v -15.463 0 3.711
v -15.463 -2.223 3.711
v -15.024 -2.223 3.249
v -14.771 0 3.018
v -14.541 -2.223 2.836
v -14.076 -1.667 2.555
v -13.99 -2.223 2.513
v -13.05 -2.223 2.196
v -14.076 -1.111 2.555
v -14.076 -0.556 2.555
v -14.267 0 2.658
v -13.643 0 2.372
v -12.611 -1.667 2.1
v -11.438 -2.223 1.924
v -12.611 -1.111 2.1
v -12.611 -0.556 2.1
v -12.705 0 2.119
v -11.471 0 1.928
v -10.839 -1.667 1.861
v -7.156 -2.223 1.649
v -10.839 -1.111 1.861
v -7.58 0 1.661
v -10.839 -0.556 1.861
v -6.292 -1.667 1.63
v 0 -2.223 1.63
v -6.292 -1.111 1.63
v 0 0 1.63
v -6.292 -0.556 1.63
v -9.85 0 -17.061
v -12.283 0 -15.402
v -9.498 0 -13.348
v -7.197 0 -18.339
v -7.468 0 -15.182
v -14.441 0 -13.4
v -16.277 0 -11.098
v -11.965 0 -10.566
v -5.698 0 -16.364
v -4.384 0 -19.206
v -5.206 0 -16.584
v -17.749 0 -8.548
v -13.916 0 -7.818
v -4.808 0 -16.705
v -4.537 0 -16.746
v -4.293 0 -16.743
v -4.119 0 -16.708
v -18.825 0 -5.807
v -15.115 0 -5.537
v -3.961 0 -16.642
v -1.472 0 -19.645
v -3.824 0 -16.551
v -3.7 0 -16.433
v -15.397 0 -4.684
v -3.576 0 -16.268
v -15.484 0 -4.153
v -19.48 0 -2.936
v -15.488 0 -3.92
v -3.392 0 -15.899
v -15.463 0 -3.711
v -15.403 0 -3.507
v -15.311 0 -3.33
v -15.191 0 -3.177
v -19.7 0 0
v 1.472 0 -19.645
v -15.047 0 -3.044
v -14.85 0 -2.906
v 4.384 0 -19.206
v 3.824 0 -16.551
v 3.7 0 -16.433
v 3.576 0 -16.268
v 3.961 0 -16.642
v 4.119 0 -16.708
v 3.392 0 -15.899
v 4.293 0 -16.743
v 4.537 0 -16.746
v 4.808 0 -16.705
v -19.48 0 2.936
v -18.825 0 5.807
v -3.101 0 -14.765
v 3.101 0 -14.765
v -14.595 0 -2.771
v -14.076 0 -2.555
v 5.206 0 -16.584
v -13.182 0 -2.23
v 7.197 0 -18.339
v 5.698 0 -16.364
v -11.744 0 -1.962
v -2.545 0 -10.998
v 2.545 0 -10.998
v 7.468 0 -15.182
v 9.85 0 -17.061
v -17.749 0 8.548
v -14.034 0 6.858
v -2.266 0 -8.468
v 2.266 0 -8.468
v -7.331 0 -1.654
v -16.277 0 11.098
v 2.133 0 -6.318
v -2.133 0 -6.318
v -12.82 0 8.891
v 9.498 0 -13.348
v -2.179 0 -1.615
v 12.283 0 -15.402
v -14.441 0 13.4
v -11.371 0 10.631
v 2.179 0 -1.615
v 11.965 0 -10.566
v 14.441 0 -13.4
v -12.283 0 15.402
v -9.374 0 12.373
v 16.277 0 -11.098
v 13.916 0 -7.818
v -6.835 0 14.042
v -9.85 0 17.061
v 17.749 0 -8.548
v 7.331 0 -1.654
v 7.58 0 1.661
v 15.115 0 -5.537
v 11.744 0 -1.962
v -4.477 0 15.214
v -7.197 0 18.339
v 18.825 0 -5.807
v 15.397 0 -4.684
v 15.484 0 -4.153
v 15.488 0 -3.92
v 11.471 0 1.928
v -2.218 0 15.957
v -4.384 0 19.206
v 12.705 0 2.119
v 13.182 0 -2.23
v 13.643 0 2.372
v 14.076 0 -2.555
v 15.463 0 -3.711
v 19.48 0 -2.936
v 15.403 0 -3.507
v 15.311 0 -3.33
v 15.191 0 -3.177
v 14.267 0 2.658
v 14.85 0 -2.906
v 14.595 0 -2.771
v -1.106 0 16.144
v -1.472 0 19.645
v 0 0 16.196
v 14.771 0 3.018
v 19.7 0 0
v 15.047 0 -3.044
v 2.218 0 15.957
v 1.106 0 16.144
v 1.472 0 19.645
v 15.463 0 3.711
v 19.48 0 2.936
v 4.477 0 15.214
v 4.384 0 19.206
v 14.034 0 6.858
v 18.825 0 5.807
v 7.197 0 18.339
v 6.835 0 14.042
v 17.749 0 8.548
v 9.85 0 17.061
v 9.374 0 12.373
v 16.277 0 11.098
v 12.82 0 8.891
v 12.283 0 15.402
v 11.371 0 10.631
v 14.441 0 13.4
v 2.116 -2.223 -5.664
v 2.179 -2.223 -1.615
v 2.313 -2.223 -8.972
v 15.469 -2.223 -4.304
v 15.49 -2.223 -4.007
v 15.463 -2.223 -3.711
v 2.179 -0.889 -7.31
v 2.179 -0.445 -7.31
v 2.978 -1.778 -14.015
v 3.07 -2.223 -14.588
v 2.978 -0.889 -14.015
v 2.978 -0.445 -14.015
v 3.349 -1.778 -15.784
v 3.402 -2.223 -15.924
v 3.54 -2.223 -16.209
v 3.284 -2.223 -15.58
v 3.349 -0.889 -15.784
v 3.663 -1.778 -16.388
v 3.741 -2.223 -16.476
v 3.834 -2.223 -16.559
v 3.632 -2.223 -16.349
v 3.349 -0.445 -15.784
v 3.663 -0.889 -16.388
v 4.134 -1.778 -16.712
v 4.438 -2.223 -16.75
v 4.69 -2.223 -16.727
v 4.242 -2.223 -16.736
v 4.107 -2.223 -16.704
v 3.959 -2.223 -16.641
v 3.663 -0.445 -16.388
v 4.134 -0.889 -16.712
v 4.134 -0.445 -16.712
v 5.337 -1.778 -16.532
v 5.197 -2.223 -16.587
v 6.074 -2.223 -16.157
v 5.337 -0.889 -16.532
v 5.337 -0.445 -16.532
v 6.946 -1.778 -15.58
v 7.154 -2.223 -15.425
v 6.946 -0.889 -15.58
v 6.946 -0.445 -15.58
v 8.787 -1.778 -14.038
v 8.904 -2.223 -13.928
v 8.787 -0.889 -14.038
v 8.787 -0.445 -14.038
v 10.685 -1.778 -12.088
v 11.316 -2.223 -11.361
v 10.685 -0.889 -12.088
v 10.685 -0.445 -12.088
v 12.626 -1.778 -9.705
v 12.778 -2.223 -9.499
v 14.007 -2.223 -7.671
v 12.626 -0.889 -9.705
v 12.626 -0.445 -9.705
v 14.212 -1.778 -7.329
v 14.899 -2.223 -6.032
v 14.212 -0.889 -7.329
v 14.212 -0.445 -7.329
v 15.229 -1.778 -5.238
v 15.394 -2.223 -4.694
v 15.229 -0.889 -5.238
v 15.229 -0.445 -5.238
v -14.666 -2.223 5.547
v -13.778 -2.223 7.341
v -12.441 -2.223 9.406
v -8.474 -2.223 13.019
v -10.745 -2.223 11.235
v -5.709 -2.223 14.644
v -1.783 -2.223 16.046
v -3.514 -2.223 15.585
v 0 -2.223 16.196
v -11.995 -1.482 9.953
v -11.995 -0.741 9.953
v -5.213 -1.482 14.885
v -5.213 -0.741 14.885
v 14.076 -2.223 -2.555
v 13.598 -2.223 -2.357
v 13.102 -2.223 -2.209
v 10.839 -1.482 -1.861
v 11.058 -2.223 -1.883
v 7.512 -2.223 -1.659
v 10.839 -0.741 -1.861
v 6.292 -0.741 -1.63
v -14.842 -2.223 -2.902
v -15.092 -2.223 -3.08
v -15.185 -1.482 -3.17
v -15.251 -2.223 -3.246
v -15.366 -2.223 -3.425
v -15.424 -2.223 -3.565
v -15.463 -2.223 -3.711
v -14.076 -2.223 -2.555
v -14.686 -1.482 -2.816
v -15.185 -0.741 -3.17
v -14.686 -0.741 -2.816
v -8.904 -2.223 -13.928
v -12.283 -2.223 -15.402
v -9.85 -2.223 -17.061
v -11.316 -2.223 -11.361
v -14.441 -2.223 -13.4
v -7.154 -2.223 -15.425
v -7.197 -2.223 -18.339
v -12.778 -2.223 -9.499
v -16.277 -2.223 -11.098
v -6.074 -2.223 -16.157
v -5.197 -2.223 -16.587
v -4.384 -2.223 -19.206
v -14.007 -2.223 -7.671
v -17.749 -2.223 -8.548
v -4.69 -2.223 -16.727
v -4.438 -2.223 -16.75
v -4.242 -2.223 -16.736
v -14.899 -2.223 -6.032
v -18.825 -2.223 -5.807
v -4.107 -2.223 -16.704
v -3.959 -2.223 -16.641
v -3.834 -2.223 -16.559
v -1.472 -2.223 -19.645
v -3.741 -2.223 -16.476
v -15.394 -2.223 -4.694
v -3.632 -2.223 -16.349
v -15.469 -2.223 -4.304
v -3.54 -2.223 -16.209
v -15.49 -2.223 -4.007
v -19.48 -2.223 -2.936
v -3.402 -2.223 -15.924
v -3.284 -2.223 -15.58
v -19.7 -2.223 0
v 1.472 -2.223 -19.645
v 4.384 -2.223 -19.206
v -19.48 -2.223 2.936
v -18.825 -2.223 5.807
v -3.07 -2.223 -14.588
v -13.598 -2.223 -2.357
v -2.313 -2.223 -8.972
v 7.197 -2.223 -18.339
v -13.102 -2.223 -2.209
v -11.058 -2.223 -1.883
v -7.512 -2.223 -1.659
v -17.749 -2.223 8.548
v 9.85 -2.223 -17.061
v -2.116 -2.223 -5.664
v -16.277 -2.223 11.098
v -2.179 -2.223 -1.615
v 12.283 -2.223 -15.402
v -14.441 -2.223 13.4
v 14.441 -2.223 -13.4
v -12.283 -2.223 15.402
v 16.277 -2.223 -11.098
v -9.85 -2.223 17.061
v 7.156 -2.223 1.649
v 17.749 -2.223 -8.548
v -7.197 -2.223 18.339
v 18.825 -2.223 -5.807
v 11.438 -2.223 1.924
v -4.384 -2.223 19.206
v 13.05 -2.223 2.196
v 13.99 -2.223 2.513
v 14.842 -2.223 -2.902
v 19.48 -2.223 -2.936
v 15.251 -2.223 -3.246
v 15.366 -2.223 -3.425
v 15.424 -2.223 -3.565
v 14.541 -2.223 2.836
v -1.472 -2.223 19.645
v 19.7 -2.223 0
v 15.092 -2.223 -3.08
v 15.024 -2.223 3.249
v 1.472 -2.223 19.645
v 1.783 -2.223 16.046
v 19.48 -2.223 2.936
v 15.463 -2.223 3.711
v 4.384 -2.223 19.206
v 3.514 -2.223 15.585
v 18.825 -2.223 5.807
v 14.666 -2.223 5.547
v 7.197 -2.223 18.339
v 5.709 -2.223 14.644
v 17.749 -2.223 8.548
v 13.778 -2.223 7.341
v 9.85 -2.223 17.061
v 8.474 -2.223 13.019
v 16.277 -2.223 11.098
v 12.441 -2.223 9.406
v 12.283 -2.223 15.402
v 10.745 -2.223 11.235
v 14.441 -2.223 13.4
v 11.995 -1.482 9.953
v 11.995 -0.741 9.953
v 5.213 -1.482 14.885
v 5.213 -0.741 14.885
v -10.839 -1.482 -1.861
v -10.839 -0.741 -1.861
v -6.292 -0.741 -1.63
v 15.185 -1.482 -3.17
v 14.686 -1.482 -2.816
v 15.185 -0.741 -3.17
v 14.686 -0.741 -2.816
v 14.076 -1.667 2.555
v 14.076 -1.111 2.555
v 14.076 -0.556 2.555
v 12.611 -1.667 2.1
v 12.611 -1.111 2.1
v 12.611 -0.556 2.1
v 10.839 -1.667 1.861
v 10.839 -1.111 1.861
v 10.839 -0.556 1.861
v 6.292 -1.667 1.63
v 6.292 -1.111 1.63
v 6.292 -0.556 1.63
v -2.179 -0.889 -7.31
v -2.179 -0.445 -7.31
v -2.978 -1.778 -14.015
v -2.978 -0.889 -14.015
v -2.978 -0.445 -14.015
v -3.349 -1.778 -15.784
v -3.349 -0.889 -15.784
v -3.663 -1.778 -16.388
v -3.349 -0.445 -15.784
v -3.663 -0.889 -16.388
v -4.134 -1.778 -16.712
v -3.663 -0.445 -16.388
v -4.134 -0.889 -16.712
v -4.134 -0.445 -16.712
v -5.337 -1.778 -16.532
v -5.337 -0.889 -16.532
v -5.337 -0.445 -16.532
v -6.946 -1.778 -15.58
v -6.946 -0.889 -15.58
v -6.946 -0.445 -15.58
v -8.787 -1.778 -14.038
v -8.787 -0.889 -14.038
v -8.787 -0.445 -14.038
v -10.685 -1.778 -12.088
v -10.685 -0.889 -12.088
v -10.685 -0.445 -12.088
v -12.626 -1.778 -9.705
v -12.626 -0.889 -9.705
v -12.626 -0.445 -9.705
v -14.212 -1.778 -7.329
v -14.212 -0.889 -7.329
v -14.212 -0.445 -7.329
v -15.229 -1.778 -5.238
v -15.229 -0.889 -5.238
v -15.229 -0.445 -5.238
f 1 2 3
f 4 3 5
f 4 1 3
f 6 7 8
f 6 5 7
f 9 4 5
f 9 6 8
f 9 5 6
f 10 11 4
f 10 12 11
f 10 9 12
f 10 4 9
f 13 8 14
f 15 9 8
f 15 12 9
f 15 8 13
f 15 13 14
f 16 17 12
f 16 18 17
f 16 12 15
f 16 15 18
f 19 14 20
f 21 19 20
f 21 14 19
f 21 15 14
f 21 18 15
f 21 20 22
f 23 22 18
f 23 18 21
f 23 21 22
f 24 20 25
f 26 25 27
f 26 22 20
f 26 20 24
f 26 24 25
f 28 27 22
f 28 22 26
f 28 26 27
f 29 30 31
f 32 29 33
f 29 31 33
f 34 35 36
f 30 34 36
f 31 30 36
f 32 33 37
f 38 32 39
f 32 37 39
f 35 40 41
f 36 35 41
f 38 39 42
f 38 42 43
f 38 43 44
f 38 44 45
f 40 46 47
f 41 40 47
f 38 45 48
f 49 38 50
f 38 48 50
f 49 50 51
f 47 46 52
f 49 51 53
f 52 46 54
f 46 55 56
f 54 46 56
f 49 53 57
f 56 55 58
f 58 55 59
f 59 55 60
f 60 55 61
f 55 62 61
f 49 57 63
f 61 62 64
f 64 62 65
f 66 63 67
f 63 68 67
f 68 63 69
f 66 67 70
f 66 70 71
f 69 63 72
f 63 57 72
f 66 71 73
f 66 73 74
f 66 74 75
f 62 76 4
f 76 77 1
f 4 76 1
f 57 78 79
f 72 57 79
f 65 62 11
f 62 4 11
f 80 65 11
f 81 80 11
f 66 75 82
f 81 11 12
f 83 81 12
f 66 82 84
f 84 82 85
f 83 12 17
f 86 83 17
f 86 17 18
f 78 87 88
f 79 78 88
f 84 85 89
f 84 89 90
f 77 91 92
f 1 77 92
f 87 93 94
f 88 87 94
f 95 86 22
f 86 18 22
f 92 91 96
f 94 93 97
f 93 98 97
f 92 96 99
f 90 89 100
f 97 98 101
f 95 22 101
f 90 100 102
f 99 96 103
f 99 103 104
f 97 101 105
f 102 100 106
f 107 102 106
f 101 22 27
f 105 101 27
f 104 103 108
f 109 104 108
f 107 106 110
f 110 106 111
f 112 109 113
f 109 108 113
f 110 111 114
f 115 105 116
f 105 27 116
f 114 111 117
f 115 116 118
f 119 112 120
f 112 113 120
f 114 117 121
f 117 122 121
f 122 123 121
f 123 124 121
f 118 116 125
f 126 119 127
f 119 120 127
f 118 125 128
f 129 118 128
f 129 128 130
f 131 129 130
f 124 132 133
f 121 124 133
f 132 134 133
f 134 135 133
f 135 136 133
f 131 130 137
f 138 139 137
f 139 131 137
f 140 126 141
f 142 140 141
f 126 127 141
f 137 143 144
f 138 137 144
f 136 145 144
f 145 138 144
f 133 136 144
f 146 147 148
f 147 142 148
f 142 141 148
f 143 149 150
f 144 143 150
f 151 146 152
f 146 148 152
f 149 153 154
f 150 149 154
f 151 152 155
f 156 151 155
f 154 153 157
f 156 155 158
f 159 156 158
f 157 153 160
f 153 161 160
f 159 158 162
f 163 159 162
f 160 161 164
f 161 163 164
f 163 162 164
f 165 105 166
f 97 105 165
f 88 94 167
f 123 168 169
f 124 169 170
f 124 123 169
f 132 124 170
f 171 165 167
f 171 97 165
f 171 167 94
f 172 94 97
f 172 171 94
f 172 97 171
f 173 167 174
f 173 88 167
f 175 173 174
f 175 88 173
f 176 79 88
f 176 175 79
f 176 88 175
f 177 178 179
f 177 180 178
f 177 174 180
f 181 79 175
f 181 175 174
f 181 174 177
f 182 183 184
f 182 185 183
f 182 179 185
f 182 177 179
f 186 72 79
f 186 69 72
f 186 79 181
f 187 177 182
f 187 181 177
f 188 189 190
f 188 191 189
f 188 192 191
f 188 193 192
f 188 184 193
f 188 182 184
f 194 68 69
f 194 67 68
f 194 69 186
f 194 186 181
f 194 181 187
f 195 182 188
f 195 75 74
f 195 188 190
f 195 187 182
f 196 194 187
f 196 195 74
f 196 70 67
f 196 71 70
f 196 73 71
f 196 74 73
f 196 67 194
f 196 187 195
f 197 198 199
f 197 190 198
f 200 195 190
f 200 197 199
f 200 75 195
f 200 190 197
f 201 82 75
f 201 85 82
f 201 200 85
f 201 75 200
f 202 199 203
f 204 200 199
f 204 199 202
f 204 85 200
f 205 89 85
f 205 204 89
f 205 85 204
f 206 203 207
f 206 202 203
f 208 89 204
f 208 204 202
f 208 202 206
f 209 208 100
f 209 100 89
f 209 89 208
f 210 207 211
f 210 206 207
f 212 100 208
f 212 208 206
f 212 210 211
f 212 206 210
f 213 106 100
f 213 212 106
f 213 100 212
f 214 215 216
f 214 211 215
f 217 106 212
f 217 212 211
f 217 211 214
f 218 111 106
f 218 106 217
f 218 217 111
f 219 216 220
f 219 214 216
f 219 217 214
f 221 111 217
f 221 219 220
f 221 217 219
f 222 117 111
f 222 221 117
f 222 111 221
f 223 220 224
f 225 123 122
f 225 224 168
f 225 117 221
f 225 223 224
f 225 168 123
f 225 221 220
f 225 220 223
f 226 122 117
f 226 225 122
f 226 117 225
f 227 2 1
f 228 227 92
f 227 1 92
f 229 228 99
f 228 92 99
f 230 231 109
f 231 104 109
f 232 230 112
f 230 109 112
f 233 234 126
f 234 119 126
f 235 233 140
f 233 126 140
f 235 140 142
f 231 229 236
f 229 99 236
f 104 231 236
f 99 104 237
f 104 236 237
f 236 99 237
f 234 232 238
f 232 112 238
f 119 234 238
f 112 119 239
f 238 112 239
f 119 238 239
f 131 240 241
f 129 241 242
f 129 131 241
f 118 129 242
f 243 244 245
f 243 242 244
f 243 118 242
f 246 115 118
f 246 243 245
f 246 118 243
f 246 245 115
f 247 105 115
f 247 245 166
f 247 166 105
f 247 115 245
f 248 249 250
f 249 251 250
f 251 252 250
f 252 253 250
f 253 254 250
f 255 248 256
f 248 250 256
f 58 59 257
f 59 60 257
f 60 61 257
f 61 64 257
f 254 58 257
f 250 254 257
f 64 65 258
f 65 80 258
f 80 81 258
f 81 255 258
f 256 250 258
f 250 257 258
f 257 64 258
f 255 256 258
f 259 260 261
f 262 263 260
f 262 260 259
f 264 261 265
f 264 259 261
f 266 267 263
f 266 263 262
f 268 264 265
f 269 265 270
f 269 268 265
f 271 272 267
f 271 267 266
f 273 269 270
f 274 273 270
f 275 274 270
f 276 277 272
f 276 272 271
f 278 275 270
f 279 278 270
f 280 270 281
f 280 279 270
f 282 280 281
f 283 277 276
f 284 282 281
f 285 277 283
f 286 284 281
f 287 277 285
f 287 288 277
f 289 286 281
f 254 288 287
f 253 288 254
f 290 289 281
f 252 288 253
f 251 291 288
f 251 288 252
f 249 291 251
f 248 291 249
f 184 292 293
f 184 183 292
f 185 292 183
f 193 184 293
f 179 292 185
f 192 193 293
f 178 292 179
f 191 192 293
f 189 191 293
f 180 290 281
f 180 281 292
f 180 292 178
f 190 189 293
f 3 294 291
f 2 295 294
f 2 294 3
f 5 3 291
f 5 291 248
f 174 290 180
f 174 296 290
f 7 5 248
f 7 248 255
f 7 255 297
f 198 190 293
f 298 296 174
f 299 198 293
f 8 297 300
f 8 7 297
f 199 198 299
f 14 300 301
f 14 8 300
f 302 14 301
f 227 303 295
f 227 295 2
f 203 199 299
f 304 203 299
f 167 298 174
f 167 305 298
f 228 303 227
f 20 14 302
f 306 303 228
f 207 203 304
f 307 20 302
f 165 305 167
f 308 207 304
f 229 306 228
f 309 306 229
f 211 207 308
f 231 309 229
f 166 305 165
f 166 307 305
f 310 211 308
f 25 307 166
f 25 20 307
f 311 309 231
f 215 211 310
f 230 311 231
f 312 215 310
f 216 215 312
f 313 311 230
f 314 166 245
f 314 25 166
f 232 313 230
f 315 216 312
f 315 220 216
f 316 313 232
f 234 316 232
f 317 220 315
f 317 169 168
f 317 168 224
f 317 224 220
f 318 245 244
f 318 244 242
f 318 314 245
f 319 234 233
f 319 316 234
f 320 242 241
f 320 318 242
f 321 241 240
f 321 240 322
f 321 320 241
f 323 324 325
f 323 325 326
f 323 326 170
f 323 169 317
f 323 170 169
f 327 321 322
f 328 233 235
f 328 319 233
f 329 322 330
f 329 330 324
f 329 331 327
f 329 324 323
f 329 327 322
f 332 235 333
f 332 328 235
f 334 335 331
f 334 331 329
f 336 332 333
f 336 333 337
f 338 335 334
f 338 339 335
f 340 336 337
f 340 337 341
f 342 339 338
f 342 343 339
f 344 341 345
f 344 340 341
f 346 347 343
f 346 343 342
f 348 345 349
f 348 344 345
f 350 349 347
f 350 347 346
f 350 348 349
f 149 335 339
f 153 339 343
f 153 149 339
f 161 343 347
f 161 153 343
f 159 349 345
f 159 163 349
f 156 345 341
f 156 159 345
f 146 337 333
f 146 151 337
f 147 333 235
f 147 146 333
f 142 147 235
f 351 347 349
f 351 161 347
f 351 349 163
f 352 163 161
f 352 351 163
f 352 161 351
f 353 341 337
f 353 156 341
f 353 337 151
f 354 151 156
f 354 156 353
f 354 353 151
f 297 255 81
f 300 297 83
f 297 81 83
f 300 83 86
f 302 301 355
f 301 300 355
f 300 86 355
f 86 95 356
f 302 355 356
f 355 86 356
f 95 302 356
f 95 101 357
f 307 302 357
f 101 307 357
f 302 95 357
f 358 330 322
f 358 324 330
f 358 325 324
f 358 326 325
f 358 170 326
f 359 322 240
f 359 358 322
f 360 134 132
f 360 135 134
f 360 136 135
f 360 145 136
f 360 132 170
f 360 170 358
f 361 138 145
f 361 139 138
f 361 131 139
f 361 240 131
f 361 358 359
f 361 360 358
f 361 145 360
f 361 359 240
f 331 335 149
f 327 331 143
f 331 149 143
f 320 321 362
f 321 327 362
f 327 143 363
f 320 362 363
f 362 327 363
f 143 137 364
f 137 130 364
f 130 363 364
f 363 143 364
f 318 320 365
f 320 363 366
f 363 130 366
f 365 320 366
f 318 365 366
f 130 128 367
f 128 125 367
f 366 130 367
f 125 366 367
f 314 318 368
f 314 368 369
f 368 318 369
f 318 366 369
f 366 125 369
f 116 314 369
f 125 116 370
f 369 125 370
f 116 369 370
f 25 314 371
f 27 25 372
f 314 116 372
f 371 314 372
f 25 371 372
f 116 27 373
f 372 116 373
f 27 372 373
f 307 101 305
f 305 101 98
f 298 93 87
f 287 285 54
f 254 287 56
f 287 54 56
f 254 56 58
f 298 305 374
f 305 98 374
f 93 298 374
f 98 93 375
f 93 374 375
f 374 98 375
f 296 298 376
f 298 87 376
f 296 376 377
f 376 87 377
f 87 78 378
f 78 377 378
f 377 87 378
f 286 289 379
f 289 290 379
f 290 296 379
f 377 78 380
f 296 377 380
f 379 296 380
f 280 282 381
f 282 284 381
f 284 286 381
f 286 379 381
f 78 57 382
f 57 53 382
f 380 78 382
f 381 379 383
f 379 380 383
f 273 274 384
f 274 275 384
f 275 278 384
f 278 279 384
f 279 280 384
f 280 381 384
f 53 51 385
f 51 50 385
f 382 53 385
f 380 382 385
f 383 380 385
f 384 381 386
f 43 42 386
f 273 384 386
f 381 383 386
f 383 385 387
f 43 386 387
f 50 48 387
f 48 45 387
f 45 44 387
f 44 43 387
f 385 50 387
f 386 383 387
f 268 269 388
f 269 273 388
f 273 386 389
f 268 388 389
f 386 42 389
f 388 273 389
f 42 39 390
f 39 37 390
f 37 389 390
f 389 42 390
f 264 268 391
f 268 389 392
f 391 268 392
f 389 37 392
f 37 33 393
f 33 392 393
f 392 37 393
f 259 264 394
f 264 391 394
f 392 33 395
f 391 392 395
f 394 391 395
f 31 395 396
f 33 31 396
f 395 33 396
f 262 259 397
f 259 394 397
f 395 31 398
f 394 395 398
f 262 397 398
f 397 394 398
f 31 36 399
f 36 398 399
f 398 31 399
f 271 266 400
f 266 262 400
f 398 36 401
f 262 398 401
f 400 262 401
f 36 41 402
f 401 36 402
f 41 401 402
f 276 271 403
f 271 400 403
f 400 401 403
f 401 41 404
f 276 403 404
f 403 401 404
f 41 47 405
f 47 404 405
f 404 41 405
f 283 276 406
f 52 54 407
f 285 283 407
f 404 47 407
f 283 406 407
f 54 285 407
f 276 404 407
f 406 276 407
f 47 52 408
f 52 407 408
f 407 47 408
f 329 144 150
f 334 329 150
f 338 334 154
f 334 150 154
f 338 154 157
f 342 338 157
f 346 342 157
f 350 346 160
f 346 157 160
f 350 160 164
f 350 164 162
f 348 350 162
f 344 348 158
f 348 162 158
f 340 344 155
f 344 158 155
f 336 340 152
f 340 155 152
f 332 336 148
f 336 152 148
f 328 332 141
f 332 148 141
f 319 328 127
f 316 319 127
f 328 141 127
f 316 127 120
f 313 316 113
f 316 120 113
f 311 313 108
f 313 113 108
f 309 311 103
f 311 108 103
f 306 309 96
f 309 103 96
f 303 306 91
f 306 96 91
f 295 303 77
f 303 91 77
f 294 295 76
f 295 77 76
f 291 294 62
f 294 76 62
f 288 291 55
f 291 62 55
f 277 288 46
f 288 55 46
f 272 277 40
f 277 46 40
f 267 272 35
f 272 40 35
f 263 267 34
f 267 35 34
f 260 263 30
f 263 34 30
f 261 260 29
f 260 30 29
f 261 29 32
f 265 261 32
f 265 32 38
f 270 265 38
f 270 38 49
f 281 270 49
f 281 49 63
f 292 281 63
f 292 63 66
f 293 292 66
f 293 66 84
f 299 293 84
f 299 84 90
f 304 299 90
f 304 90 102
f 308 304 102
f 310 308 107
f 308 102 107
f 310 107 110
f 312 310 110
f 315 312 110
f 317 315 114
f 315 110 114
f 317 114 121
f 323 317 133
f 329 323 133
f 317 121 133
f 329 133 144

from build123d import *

# Parameters (mm, degrees)
F0_R     = 19.7003752355
F2_DEPTH = 2.22259
F3_DEPTH = 50.8


with BuildPart() as f2:
    # F0 (on Front) → F2 (new body)
    with BuildSketch(Plane.XZ):
        Circle(F0_R)
    extrude(amount=F2_DEPTH)

    # F1 (on Front) → F3 (cut)
    with BuildSketch(Plane.XZ):
        with BuildLine():
            add(Edge.make_bspline(
                [(-15.4631529003, 3.7106473465), (-14.5552424255, 5.8376593389), (-12.6612678067, 10.4135707044), (-5.4146128635, 15.1931010605), (-1.6903024735, 16.2212316653), (0, 16.1956194788)],
                knots=[0, 0, 0, 0, 0.3388400409, 0.7060250476, 1, 1, 1, 1], degree=3))
            add(Edge.make_bspline(
                [(-15.4631529003, 3.7106473465), (-15.0705248118, 3.2824982893), (-14.1462936866, 2.2746521968), (-10.6562267886, 1.7786678876), (-6.2118109856, 1.5820085187), (-2.1790945776, 1.6130470288), (0, 1.6298188129)],
                knots=[0, 0, 0, 0, 0.1721615526, 0.4052615442, 0.6786306765, 1, 1, 1, 1], degree=3))
            add(Edge.make_bspline(
                [(15.4631529003, 3.7106473465), (15.0705248118, 3.2824982893), (14.1462936866, 2.2746521968), (10.6562267886, 1.7786678876), (6.2118109856, 1.5820085187), (2.1790945776, 1.6130470288), (0, 1.6298188129)],
                knots=[0, 0, 0, 0, 0.1721615526, 0.4052615442, 0.6786306765, 1, 1, 1, 1], degree=3))
            add(Edge.make_bspline(
                [(15.4631529003, 3.7106473465), (14.5552424255, 5.8376593389), (12.6612678067, 10.4135707044), (5.4146128635, 15.1931010605), (1.6903024735, 16.2212316653), (0, 16.1956194788)],
                knots=[0, 0, 0, 0, 0.3388400409, 0.7060250476, 1, 1, 1, 1], degree=3))
        make_face()
        with BuildLine():
            add(Edge.make_bspline(
                [(-15.4631529003, -3.7106473465), (-15.3319688501, -3.0453276363), (-14.7039514029, -2.7999797142), (-14.0759339556, -2.554631792)],
                knots=[0.9038743853, 0.9038743853, 0.9038743853, 0.9038743853, 1, 1, 1, 1], degree=3))
            add(Edge.make_bspline(
                [(-15.4631529003, -3.7106473465), (-15.0705248118, -3.2824982893), (-14.6778967233, -2.8543492322), (-14.0759339556, -2.554631792)],
                knots=[0, 0, 0, 0, 0.1721615526, 0.1721615526, 0.1721615526, 0.1721615526], degree=3))
        make_face()
        with BuildLine():
            add(Edge.make_bspline(
                [(14.0759339556, -2.554631792), (13.2608999715, -2.1488261302), (10.6562267886, -1.7786678876), (6.7893336665, -1.6075631137), (3.6104419525, -1.6074565323), (2.1790336875, -1.6148637863)],
                knots=[0.1721615526, 0.1721615526, 0.1721615526, 0.1721615526, 0.4052615442, 0.6786306765, 0.8924278239, 0.8924278239, 0.8924278239, 0.8924278239], degree=3))
            add(Edge.make_bspline(
                [(2.1790336877, -1.6148637864), (2.1177120023, -3.4445059013), (1.9897349933, -7.2668640171), (2.8961871372, -13.6115071942), (3.6903489801, -18.392541145), (11.2728278149, -12.4760903279), (15.7663256662, -5.2482337856), (15.4631529003, -3.7106473465)],
                knots=[5.64935e-05, 5.64935e-05, 5.64935e-05, 5.64935e-05, 0.170738923, 0.3566207898, 0.4791636808, 0.6817233812, 0.9038743853, 0.9038743853, 0.9038743853, 0.9038743853], degree=3))
            add(Edge.make_bspline(
                [(15.4631529003, -3.7106473465), (15.0705248118, -3.2824982893), (14.6778967233, -2.8543492322), (14.0759339556, -2.554631792)],
                knots=[0, 0, 0, 0, 0.1721615526, 0.1721615526, 0.1721615526, 0.1721615526], degree=3))
        make_face()
        with BuildLine():
            add(Edge.make_bspline(
                [(-15.4631529003, -3.7106473465), (-15.0705248118, -3.2824982893), (-14.6778967233, -2.8543492322), (-14.0759339556, -2.554631792)],
                knots=[0, 0, 0, 0, 0.1721615526, 0.1721615526, 0.1721615526, 0.1721615526], degree=3))
            add(Edge.make_bspline(
                [(-2.1790336877, -1.6148637864), (-2.1177120023, -3.4445059013), (-1.9897349933, -7.2668640171), (-2.8961871372, -13.6115071942), (-3.6903489801, -18.392541145), (-11.2728278149, -12.4760903279), (-15.7663256662, -5.2482337856), (-15.4631529003, -3.7106473465)],
                knots=[5.64935e-05, 5.64935e-05, 5.64935e-05, 5.64935e-05, 0.170738923, 0.3566207898, 0.4791636808, 0.6817233812, 0.9038743853, 0.9038743853, 0.9038743853, 0.9038743853], degree=3))
            add(Edge.make_bspline(
                [(-14.0759339556, -2.554631792), (-13.2608999715, -2.1488261302), (-10.6562267886, -1.7786678876), (-6.7893336665, -1.6075631137), (-3.6104419525, -1.6074565323), (-2.1790336875, -1.6148637863)],
                knots=[0.1721615526, 0.1721615526, 0.1721615526, 0.1721615526, 0.4052615442, 0.6786306765, 0.8924278239, 0.8924278239, 0.8924278239, 0.8924278239], degree=3))
        make_face()
        with BuildLine():
            add(Edge.make_bspline(
                [(15.4631529003, -3.7106473465), (15.0705248118, -3.2824982893), (14.6778967233, -2.8543492322), (14.0759339556, -2.554631792)],
                knots=[0, 0, 0, 0, 0.1721615526, 0.1721615526, 0.1721615526, 0.1721615526], degree=3))
            add(Edge.make_bspline(
                [(15.4631529003, -3.7106473465), (15.3319688501, -3.0453276363), (14.7039514029, -2.7999797142), (14.0759339556, -2.554631792)],
                knots=[0.9038743853, 0.9038743853, 0.9038743853, 0.9038743853, 1, 1, 1, 1], degree=3))
        make_face()
    extrude(amount=F3_DEPTH, mode=Mode.SUBTRACT)


solid = f2.part
